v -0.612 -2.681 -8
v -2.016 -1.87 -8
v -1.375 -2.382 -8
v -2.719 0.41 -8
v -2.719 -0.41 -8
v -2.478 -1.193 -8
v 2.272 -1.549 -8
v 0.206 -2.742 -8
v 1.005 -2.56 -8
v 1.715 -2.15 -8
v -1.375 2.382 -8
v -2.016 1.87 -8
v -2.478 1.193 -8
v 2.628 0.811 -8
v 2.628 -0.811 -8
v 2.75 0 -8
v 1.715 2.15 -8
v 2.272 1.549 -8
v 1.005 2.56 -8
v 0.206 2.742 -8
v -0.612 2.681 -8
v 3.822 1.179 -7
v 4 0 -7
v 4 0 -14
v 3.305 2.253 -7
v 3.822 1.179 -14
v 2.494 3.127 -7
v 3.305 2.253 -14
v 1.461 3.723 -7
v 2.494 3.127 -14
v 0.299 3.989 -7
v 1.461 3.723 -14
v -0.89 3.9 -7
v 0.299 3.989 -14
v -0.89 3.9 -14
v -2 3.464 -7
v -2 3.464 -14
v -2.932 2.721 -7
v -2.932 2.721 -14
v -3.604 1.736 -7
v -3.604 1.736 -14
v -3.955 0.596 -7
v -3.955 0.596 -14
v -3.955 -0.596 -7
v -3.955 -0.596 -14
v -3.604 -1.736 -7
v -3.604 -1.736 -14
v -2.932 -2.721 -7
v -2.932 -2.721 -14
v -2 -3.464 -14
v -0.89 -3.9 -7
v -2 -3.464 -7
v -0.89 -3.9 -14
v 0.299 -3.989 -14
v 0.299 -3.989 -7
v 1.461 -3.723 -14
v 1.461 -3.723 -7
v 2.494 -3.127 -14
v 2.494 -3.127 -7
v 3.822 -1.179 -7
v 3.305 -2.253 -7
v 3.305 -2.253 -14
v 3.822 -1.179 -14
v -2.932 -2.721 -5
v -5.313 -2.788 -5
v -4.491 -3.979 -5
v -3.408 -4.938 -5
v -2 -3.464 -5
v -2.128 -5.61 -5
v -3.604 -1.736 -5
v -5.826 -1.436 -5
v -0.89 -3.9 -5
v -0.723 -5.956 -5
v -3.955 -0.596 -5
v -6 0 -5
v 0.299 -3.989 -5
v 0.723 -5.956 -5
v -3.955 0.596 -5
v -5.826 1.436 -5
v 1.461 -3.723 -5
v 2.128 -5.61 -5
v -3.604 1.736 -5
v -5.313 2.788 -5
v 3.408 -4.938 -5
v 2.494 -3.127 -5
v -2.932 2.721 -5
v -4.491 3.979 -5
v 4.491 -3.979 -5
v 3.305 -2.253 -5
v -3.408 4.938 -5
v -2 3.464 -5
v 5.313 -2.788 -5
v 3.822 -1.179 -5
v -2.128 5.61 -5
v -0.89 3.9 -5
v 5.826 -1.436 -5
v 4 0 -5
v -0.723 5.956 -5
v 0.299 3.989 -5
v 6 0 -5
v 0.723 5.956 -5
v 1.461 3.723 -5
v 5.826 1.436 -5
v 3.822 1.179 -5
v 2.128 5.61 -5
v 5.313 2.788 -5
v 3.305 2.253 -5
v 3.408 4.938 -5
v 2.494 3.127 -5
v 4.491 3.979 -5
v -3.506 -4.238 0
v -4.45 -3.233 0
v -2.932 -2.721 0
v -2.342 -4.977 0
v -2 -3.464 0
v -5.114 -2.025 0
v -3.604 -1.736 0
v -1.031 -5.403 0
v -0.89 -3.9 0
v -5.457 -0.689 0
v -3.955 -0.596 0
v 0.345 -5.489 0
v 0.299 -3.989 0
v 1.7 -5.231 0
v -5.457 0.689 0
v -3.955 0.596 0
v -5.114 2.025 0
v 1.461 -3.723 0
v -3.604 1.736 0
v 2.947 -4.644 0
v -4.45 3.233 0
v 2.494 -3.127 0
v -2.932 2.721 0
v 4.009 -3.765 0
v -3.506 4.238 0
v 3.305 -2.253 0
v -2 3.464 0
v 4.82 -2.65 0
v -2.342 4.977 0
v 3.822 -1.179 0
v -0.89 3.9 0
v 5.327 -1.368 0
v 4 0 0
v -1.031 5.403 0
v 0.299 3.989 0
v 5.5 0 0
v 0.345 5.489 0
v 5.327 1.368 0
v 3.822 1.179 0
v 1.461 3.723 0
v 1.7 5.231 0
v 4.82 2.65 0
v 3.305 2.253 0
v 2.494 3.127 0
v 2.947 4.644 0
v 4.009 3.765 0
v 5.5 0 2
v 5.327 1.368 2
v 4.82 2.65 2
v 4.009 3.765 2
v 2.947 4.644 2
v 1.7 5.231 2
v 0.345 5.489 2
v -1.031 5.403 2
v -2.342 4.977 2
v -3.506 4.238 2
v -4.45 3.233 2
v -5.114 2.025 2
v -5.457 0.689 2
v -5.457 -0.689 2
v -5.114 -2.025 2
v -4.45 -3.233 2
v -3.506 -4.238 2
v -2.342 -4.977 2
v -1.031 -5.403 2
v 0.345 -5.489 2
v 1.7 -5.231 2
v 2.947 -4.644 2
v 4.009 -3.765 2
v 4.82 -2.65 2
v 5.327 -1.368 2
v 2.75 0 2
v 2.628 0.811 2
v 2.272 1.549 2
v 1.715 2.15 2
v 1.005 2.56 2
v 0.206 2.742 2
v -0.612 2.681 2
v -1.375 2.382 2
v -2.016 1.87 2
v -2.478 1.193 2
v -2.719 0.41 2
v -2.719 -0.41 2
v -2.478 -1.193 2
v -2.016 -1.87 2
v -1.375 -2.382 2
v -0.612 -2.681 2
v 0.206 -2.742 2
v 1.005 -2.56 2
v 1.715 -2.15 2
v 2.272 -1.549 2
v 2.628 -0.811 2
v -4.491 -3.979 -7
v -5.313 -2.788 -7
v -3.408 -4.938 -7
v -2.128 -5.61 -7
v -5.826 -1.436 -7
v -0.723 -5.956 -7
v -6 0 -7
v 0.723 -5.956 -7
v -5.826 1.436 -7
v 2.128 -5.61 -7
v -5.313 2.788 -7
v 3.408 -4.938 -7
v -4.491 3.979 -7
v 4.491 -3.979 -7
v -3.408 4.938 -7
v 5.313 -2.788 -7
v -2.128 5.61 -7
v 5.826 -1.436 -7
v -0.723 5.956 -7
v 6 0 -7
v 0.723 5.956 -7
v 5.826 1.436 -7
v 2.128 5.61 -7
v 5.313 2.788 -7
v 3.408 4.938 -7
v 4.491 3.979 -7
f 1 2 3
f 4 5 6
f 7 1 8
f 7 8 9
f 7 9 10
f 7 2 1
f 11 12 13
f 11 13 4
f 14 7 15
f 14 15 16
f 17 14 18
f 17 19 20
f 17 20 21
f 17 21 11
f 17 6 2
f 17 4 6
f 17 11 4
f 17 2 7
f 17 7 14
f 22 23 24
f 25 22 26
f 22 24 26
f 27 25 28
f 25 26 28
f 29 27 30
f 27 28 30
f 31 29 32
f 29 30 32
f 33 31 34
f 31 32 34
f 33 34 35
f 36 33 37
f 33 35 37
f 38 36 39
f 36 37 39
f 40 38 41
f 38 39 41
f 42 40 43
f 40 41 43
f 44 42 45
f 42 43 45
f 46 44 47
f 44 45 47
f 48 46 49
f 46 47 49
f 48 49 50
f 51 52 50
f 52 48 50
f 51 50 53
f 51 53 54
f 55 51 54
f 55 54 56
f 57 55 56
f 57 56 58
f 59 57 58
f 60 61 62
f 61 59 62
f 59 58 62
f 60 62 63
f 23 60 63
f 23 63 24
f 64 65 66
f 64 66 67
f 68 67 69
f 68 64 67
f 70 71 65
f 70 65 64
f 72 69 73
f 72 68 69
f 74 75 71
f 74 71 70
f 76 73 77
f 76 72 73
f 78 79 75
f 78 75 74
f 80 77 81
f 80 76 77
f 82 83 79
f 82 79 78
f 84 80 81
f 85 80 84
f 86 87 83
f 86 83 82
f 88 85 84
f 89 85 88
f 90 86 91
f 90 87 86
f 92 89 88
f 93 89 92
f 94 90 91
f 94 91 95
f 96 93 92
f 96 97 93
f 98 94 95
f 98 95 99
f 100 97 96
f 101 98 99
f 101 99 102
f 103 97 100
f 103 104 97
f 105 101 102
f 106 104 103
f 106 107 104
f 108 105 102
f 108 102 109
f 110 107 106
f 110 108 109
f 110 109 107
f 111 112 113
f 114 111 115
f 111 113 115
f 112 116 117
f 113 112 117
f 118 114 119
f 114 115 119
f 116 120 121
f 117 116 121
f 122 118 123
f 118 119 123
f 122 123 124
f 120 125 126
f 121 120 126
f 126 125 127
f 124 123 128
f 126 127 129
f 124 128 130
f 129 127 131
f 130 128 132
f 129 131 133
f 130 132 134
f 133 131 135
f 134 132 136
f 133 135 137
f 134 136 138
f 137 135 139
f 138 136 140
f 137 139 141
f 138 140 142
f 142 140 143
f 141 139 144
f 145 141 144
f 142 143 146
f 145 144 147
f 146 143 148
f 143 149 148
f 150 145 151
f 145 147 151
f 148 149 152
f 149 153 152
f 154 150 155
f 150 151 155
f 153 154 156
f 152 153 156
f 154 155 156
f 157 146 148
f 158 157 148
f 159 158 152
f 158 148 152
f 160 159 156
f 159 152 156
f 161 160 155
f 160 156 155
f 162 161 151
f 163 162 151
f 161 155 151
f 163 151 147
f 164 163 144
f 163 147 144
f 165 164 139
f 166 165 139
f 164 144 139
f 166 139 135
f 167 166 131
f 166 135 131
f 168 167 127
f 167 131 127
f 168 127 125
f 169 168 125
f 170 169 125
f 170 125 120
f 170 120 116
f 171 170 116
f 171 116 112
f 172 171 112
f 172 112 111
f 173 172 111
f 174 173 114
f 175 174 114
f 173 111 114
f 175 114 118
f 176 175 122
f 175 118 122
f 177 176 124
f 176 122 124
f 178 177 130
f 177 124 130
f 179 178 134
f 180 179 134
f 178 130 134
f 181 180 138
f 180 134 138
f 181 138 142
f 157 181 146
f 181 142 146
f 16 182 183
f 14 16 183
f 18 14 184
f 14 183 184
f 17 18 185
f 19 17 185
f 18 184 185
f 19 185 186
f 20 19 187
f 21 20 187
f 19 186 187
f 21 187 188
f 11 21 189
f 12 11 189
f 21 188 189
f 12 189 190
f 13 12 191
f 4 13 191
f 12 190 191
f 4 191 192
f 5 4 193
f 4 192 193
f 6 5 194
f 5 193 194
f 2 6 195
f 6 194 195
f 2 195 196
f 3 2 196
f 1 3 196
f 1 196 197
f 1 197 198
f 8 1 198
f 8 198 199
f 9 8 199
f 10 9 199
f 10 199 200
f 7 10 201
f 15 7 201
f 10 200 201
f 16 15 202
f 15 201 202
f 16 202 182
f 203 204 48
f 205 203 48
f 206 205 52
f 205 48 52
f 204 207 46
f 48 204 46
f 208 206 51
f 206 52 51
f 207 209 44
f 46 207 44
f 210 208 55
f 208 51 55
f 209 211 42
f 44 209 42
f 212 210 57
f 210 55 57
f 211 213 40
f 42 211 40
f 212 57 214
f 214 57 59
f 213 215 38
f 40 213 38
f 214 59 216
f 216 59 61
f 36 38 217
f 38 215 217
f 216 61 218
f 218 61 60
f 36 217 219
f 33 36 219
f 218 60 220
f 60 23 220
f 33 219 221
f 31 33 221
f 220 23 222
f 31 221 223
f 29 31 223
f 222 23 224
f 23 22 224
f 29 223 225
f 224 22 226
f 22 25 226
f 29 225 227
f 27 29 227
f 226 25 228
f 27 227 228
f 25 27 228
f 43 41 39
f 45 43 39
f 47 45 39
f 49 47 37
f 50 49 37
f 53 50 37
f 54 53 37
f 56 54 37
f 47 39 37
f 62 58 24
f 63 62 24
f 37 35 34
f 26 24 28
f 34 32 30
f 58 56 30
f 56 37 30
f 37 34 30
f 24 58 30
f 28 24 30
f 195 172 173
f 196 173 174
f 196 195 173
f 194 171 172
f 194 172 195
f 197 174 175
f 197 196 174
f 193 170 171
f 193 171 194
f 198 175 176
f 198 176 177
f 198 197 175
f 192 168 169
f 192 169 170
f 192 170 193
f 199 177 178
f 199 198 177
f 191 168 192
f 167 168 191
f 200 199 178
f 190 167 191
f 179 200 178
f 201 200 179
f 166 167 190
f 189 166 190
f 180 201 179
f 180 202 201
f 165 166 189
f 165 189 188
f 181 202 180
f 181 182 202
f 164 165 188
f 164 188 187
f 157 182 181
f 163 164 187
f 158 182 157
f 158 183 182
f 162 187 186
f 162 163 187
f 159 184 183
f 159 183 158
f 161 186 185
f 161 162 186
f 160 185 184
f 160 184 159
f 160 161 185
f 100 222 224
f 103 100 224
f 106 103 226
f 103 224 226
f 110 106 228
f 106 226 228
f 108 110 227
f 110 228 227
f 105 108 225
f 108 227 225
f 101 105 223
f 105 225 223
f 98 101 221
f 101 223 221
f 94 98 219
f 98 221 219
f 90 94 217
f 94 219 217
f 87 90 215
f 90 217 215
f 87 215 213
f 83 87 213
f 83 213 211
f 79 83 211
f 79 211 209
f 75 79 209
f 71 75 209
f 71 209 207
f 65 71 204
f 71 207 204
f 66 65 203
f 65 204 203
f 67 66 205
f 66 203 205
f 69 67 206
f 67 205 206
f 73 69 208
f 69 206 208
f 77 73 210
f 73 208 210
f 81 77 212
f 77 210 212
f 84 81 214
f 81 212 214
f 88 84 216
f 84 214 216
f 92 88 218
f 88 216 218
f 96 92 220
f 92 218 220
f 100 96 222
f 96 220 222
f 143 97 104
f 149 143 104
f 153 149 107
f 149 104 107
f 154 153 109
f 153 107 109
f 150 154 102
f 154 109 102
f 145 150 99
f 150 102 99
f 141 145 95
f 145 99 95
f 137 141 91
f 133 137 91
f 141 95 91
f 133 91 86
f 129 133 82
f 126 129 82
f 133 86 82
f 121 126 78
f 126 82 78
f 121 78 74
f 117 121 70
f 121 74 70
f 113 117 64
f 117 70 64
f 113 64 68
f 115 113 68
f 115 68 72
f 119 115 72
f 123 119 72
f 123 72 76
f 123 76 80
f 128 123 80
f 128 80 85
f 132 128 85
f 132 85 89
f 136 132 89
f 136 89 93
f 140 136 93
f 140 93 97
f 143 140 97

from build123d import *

# Parameters (mm, degrees)
SKETCH1_R    = 5.5
FLANGE_DEPTH = 2
BARREL_START = -14
SKETCH2_R    = 4
BARREL_DEPTH = 14
NUT_START    = -7
SKETCH3_R    = 6
NUT_DEPTH    = 2
SOCKET_START = 2
SKETCH4_R    = 2.75
SOCKET_DEPTH = 10


with BuildPart() as part:
    # Sketch1 → Flange (new body)
    with BuildSketch(Plane.XY):
        Circle(SKETCH1_R)
    extrude(amount=FLANGE_DEPTH)

    # Sketch2 → Barrel (add)
    with BuildSketch(Plane.XY.offset(BARREL_START)):
        Circle(SKETCH2_R)
    extrude(amount=BARREL_DEPTH)

    # Sketch3 → Nut (add)
    with BuildSketch(Plane.XY.offset(NUT_START)):
        Circle(SKETCH3_R)
    extrude(amount=NUT_DEPTH)

    # Sketch4 → Socket (cut)
    with BuildSketch(Plane.XY.offset(SOCKET_START)):
        Circle(SKETCH4_R)
    extrude(amount=-SOCKET_DEPTH, mode=Mode.SUBTRACT)


solid = part.part
